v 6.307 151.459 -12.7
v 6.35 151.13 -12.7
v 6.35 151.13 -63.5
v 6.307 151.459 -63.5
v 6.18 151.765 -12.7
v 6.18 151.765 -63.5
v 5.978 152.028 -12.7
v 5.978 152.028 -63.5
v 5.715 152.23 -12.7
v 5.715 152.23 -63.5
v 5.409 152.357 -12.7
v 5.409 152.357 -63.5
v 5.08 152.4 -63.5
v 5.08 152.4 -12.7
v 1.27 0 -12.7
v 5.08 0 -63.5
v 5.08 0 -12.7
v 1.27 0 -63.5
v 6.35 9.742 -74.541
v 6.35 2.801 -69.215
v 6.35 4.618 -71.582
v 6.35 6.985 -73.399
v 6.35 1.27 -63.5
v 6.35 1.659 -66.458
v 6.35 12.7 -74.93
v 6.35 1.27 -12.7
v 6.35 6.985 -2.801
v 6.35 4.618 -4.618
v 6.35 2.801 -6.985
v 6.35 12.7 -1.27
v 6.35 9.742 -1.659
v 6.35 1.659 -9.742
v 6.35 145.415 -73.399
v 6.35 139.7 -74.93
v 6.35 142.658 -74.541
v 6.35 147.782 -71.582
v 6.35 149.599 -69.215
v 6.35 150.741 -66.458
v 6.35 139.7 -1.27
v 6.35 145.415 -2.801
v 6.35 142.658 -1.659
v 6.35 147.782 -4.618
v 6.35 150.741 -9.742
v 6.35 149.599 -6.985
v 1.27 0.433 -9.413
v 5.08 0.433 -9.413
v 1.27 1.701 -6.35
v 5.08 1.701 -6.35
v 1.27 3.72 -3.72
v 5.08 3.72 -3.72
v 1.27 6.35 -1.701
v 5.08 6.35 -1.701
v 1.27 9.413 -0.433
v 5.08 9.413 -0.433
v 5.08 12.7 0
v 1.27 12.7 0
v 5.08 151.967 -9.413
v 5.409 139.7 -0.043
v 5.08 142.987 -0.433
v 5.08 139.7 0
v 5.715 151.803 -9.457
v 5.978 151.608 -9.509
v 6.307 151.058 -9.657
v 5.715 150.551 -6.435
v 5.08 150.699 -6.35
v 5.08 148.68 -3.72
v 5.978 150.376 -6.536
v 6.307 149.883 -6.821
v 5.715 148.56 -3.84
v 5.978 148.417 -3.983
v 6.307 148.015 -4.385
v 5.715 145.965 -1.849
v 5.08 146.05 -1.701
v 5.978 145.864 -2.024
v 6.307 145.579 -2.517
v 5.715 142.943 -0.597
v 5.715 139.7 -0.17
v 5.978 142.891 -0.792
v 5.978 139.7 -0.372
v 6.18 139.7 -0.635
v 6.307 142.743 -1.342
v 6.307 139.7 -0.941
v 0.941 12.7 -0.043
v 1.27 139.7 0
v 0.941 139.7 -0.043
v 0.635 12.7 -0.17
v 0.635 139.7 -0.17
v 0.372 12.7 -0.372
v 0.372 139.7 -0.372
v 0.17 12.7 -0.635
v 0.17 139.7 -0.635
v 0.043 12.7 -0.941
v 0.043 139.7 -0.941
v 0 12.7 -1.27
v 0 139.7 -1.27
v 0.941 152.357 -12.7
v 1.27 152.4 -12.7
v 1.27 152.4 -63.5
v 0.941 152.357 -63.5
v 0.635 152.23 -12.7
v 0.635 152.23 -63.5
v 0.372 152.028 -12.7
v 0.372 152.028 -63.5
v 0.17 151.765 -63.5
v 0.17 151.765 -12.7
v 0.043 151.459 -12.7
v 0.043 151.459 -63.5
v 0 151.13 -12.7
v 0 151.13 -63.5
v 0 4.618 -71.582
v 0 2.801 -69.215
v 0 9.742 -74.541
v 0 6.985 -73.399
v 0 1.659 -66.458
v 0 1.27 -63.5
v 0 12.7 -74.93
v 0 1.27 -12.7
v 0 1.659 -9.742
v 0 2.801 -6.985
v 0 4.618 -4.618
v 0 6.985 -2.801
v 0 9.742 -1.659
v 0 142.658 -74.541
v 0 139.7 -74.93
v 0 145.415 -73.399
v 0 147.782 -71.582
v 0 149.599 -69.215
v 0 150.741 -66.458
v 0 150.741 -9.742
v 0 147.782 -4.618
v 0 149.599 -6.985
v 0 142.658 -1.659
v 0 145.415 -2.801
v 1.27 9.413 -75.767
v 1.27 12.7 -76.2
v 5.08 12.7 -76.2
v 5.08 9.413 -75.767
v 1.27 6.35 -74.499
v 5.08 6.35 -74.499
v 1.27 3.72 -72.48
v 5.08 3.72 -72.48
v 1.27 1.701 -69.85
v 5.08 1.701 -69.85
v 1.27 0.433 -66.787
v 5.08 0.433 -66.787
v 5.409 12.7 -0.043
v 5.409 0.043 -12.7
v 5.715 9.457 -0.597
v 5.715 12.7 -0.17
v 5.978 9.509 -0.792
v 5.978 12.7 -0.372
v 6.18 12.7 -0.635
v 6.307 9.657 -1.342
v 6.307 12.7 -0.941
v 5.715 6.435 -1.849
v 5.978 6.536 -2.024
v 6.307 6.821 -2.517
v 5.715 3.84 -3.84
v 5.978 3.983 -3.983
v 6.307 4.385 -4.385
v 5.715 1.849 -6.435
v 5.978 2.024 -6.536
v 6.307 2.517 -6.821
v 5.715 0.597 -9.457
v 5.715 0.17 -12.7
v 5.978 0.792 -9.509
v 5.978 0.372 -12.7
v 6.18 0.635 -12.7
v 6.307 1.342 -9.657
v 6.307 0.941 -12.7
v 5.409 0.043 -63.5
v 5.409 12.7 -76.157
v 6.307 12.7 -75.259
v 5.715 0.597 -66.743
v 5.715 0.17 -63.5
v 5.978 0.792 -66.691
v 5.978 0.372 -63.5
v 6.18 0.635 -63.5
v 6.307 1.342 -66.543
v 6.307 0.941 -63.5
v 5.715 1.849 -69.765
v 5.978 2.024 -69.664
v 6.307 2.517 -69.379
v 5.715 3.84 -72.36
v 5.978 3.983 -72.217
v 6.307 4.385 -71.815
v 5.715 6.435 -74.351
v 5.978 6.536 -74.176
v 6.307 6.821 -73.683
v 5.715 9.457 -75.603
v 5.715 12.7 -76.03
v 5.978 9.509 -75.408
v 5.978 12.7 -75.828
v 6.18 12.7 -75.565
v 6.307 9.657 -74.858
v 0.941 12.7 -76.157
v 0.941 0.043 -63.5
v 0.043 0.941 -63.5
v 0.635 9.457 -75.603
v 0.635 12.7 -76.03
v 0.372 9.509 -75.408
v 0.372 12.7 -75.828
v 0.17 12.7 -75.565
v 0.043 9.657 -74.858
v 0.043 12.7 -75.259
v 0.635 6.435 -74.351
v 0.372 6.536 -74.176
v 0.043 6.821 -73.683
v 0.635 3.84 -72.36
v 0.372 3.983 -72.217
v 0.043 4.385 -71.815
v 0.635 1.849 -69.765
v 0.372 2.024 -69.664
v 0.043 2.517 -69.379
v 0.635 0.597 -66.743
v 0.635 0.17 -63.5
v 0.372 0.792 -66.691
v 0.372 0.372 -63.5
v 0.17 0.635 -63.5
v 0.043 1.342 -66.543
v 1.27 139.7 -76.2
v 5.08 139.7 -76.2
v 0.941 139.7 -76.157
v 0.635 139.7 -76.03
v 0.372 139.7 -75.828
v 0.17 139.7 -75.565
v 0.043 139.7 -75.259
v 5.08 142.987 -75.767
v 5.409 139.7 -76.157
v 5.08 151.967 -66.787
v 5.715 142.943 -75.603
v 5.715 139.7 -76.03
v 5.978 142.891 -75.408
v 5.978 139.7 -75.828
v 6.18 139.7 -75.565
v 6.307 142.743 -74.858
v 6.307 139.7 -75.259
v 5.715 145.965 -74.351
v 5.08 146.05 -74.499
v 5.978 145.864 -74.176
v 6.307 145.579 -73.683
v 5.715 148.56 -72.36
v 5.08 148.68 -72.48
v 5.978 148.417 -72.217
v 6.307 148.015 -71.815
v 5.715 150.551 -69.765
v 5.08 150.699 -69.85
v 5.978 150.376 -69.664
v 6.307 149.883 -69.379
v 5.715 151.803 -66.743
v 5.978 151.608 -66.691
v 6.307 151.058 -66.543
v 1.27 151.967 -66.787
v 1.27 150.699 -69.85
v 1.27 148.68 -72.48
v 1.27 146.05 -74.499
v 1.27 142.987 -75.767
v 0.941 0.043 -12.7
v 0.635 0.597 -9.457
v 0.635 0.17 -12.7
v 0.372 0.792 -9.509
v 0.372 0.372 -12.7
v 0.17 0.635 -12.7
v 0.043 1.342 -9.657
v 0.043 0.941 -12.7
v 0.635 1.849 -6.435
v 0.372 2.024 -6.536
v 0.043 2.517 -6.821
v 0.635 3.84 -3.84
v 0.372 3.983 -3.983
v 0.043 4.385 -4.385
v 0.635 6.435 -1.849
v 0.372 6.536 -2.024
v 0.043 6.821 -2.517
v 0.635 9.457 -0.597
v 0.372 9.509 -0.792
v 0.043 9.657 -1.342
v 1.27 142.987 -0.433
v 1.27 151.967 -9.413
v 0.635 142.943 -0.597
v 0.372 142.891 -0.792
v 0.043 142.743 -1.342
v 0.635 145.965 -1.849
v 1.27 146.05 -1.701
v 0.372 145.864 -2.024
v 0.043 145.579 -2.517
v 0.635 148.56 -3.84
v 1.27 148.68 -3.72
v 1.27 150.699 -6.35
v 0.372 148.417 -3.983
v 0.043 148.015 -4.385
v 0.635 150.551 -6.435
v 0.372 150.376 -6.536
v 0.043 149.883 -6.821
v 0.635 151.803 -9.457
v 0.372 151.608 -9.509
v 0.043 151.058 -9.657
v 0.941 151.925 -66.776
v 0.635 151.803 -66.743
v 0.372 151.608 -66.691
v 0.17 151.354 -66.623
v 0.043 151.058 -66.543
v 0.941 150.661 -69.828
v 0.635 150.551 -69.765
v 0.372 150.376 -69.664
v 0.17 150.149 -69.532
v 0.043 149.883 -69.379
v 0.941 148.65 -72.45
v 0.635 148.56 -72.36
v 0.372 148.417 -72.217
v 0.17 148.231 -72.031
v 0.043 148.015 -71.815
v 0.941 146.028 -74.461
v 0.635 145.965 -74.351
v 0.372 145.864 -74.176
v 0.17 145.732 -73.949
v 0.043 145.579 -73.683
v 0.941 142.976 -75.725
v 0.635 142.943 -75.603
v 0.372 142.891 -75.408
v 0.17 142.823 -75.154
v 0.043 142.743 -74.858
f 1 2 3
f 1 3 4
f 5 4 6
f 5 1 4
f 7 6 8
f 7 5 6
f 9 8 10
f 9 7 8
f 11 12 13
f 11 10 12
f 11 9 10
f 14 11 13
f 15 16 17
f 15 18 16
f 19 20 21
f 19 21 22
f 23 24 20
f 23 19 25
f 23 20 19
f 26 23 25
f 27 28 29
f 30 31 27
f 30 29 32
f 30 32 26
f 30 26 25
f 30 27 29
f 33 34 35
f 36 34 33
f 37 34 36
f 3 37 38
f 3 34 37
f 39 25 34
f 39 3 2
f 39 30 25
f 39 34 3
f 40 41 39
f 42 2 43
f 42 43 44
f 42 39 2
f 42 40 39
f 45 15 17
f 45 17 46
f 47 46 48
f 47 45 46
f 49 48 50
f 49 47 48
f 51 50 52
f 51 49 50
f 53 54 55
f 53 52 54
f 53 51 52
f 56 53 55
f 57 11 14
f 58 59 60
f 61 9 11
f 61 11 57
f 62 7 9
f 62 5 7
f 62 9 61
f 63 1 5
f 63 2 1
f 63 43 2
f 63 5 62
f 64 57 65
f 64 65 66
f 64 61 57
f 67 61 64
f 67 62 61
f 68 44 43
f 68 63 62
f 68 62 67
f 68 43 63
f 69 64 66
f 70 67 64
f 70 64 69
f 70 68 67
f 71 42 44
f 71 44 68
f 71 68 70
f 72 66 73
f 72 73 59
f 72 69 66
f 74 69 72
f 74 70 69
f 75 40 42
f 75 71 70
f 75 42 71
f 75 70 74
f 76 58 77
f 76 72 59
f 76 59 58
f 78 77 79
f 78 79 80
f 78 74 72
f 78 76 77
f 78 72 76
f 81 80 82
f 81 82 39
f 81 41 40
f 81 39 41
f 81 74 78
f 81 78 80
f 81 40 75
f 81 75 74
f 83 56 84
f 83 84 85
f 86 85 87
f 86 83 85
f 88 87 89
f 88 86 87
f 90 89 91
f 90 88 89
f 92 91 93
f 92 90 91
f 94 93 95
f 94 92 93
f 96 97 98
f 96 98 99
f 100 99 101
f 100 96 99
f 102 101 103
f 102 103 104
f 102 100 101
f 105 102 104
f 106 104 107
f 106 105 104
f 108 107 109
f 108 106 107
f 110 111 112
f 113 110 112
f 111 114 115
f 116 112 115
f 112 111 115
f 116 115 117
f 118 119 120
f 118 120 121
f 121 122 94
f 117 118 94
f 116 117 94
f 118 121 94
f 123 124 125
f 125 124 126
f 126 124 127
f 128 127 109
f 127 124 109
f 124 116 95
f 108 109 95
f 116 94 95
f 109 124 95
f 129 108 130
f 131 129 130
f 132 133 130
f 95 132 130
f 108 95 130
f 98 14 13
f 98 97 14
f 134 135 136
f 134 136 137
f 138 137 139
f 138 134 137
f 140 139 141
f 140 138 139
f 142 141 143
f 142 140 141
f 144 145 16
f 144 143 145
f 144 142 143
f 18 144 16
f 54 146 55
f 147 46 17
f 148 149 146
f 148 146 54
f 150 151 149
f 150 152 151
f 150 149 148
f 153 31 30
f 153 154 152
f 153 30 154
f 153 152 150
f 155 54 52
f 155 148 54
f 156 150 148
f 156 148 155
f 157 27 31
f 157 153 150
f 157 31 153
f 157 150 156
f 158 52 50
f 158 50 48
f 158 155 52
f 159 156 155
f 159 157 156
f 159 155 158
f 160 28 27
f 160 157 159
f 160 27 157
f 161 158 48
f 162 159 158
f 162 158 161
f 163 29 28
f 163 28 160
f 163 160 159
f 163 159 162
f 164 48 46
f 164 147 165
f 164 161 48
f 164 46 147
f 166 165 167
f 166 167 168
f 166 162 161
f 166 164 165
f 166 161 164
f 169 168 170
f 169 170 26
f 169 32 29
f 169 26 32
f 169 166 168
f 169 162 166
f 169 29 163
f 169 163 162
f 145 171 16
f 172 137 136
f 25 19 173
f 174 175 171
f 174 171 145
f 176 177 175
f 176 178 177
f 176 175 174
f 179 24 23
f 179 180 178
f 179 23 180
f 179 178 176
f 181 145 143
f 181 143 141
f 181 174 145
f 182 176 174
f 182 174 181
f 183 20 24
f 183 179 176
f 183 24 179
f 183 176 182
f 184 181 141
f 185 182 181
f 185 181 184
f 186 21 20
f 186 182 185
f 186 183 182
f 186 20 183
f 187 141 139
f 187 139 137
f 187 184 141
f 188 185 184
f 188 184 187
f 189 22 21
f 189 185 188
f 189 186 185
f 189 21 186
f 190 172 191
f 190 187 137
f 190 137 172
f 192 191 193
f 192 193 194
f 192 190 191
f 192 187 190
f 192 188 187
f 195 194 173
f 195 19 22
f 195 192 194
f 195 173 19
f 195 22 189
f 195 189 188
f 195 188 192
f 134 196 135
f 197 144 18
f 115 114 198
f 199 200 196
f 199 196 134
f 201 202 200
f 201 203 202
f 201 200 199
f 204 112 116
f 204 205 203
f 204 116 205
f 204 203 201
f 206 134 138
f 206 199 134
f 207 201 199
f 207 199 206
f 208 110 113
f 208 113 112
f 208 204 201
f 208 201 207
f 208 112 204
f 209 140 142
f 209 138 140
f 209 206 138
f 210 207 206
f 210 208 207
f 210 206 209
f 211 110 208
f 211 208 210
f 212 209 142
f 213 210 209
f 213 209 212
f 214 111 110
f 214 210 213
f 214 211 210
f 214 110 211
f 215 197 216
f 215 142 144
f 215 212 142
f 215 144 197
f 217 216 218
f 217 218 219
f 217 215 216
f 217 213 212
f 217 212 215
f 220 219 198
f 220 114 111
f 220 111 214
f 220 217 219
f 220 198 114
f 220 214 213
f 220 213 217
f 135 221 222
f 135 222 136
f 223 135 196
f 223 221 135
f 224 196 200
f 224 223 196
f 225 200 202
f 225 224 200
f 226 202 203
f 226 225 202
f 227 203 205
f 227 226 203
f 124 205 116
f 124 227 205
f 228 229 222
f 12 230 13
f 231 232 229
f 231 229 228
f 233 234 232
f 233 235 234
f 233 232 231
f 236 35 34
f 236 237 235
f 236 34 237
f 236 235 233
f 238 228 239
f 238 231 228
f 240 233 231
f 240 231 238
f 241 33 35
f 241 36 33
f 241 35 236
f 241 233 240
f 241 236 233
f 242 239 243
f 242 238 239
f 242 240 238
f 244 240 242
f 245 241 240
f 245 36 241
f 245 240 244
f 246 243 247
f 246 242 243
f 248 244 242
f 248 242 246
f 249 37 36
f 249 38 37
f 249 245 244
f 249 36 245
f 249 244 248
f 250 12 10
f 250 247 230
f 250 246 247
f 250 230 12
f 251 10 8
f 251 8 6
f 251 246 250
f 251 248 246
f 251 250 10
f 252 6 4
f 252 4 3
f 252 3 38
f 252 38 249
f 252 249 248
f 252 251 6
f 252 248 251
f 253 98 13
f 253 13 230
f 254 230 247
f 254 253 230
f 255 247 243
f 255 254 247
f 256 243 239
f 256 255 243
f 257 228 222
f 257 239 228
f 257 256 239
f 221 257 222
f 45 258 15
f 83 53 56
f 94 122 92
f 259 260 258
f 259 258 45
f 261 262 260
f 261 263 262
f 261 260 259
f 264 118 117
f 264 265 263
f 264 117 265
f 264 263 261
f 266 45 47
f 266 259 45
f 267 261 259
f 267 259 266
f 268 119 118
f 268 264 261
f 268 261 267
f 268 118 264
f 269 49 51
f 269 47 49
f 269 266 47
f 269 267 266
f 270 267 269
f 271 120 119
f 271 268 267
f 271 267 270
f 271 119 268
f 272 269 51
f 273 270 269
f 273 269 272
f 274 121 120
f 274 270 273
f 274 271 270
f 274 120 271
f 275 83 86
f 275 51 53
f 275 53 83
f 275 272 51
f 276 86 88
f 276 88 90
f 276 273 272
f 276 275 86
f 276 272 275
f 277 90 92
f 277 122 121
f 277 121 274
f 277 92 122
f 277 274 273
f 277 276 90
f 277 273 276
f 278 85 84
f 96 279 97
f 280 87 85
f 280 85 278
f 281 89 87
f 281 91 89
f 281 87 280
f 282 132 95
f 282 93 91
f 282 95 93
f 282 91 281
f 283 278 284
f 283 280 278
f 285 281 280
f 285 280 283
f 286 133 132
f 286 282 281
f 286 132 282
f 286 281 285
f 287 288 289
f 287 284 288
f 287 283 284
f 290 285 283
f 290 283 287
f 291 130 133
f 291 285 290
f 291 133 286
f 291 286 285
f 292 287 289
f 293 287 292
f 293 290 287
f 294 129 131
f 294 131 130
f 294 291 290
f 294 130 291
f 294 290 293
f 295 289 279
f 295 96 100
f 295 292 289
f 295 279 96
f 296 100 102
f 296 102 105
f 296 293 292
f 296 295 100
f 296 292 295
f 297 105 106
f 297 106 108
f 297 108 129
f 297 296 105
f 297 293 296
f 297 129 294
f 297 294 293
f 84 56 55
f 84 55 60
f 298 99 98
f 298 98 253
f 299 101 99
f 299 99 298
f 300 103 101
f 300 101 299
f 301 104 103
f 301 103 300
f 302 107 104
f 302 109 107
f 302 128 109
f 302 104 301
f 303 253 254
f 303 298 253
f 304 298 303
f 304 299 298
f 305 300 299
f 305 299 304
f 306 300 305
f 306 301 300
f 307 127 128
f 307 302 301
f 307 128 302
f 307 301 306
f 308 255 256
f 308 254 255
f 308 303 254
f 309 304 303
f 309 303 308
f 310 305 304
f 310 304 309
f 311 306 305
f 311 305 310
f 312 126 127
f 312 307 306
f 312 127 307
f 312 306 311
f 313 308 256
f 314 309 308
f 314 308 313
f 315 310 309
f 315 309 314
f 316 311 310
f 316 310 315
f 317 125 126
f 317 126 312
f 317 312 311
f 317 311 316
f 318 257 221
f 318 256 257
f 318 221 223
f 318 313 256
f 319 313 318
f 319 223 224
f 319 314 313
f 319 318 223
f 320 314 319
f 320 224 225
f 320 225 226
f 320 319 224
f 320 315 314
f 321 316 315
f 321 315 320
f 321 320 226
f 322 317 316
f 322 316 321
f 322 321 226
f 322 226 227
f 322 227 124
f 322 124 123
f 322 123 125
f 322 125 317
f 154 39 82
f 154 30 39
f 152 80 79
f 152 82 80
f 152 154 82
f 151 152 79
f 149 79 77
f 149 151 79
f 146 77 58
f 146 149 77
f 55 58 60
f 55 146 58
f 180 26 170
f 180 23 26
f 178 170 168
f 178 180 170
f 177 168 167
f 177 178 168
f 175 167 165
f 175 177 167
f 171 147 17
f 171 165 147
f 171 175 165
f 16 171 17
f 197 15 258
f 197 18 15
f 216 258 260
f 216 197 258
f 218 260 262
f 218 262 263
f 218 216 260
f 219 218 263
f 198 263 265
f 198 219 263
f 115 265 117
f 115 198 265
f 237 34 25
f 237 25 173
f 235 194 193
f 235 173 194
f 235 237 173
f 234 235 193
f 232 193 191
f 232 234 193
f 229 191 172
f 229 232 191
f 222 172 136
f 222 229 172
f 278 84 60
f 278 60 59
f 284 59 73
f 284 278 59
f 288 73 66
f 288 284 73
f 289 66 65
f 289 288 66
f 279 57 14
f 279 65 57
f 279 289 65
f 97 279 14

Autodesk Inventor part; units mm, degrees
ref_plane "YZ Plane" through (0, 0, 0) normal (1, 0, 0) x (0, 1, 0)
ref_plane "XZ Plane" through (0, 0, 0) normal (0, 1, 0) x (-1, 0, 0)
ref_plane "XY Plane" through (0, 0, 0) normal (0, 0, 1) x (1, 0, 0)
sketch "Actobotics Pattern" plane through (0, 0, 0) normal (0, 0, 1) x (1, 0, 0)
  circle A0 centre (12.1352, -23.7422) radius 1.778
  circle A1 centre (9.525, -16.8274) radius 2.032
  circle A2 centre (19.05, -16.8274) radius 6.35
  circle A3 centre (19.05, -7.0484) radius 1.778
  circle A4 centre (19.05, -26.6064) radius 1.778
  circle A5 centre (25.9648, -9.9126) radius 1.778
  circle A6 centre (31.1852, -23.7422) radius 1.778
  circle A7 centre (24.6072, -30.2753) radius 1.778
  circle A8 centre (32.5428, -30.2753) radius 1.778
  circle A9 centre (28.575, -16.8274) radius 2.032
  circle A10 centre (25.9648, -23.7422) radius 1.778
  circle A11 centre (12.1352, -9.9126) radius 1.778
  circle A12 centre (31.1852, -9.9126) radius 1.778
  circle A13 centre (24.6296, -3.3571) radius 1.778
  circle A14 centre (32.5204, -3.3571) radius 1.778
  circle A15 centre (6.9148, -23.7422) radius 1.778
  circle A16 centre (6.9148, -9.9126) radius 1.778
  circle A17 centre (13.4928, -30.2753) radius 1.778
  circle A18 centre (13.4704, -3.3571) radius 1.778
  circle A19 centre (5.5796, -3.3571) radius 1.778
  circle A20 centre (5.5572, -30.2753) radius 1.778
  point P0 (12.1352, -9.9126)
  point P1 (9.271, -16.8274)
  point P2 (25.9648, -23.7422)
  point P3 (28.829, -16.8274)
  dimension "d2" = 12.7
  dimension "d7" = 360
  dimension "d8" = 3.556
  dimension "d9" = 3.556
  dimension "d10" = 3.556
  dimension "d11" = 3.556
  dimension "d12" = 3.556
  dimension "d13" = 3.556
  dimension "d15" = 3.556
  dimension "d16" = 3.556
  dimension "d17" = 3.556
  dimension "d22" = 4.064
  dimension "d23" = 4.064
  dimension "d24" = 3.556
  dimension "d25" = 3.556
  dimension "d26" = 3.556
  dimension "d27" = 3.556
  dimension "d28" = 3.556
  dimension "d29" = 3.556
  dimension "d30" = 3.556
  dimension "d31" = 3.556
sketch "REV Hub Screw Pattern" plane through (0, 0, 0) normal (0, 0, 1) x (1, 0, 0)
  circle A0 centre (7.5, 7.5) radius 1.7
  circle A1 centre (7.5, 135.5) radius 1.7
  circle A2 centre (95.5, 135.5) radius 1.7
  circle A3 centre (95.5, 7.5) radius 1.7
  line L0 (2.9959, 0) -> (100.0041, 0)
  ellipse E0 centre (3.0041, 3.0041) end of major axis (0.877, 0.877) minor radius 3 (0, 2.9959) -> (2.9959, 0) ccw
  line L1 (0, 2.9959) -> (0, 140.0041)
  ellipse E1 centre (3.0041, 139.9959) end of major axis (0.877, 142.123) minor radius 3 (2.9959, 143) -> (0, 140.0041) ccw
  line L2 (100.0041, 143) -> (2.9959, 143)
  ellipse E2 centre (99.9959, 139.9959) end of major axis (97.8687, 137.8687) minor radius 3 (103, 140.0041) -> (100.0041, 143) ccw
  line L3 (103, 2.9959) -> (103, 140.0041)
  ellipse E3 centre (99.9959, 3.0041) end of major axis (102.123, 0.877) minor radius 3 (100.0041, 0) -> (103, 2.9959) ccw
  point P0 (0, 0)
  point P1 (0, 0)
sketch "Sketch2" plane through (0, 0, 0) normal (1, 0, 0) x (0, 1, 0)
  line L0 (12.7, 0) -> (139.7, 0)
  line L1 (152.4, -12.7) -> (152.4, -63.5)
  line L2 (139.7, -76.2) -> (12.7, -76.2)
  line L3 (0, -63.5) -> (0, -12.7)
  arc A0 (152.4, -12.7) -> (139.7, 0) centre (139.7, -12.7) ccw
  arc A1 (12.7, 0) -> (0, -12.7) centre (12.7, -12.7) ccw
  arc A2 (0, -63.5) -> (12.7, -76.2) centre (12.7, -63.5) ccw
  arc A3 (139.7, -76.2) -> (152.4, -63.5) centre (139.7, -63.5) ccw
  point P0 (0, 0)
  point P1 (152.4, -76.2)
  point P2 (152.4, 0)
  point P3 (0, -76.2)
  dimension "d34" = 152.4
  dimension "d35" = 76.2
  dimension "d36" = 12.7
extrude "Extrusion1" add sketch "Sketch2" along normal blind 6.35
fillet "Fillet1" radius 1.27 16 edges at (6.35, 3.7197, -3.7197) (6.35, 0, -38.1) (6.35, 3.7197, -72.4803) (6.35, 76.2, -76.2) (6.35, 148.6803, -72.4803) (6.35, 152.4, -38.1) (6.35, 148.6803, -3.7197) (6.35, 76.2, 0) (0, 3.7197, -3.7197) (0, 0, -38.1) (0, 3.7197, -72.4803) (0, 76.2, -76.2) (0, 148.6803, -72.4803) (0, 152.4, -38.1) (0, 148.6803, -3.7197) (0, 76.2, 0)
properties part number "Phone" material "Glass"
